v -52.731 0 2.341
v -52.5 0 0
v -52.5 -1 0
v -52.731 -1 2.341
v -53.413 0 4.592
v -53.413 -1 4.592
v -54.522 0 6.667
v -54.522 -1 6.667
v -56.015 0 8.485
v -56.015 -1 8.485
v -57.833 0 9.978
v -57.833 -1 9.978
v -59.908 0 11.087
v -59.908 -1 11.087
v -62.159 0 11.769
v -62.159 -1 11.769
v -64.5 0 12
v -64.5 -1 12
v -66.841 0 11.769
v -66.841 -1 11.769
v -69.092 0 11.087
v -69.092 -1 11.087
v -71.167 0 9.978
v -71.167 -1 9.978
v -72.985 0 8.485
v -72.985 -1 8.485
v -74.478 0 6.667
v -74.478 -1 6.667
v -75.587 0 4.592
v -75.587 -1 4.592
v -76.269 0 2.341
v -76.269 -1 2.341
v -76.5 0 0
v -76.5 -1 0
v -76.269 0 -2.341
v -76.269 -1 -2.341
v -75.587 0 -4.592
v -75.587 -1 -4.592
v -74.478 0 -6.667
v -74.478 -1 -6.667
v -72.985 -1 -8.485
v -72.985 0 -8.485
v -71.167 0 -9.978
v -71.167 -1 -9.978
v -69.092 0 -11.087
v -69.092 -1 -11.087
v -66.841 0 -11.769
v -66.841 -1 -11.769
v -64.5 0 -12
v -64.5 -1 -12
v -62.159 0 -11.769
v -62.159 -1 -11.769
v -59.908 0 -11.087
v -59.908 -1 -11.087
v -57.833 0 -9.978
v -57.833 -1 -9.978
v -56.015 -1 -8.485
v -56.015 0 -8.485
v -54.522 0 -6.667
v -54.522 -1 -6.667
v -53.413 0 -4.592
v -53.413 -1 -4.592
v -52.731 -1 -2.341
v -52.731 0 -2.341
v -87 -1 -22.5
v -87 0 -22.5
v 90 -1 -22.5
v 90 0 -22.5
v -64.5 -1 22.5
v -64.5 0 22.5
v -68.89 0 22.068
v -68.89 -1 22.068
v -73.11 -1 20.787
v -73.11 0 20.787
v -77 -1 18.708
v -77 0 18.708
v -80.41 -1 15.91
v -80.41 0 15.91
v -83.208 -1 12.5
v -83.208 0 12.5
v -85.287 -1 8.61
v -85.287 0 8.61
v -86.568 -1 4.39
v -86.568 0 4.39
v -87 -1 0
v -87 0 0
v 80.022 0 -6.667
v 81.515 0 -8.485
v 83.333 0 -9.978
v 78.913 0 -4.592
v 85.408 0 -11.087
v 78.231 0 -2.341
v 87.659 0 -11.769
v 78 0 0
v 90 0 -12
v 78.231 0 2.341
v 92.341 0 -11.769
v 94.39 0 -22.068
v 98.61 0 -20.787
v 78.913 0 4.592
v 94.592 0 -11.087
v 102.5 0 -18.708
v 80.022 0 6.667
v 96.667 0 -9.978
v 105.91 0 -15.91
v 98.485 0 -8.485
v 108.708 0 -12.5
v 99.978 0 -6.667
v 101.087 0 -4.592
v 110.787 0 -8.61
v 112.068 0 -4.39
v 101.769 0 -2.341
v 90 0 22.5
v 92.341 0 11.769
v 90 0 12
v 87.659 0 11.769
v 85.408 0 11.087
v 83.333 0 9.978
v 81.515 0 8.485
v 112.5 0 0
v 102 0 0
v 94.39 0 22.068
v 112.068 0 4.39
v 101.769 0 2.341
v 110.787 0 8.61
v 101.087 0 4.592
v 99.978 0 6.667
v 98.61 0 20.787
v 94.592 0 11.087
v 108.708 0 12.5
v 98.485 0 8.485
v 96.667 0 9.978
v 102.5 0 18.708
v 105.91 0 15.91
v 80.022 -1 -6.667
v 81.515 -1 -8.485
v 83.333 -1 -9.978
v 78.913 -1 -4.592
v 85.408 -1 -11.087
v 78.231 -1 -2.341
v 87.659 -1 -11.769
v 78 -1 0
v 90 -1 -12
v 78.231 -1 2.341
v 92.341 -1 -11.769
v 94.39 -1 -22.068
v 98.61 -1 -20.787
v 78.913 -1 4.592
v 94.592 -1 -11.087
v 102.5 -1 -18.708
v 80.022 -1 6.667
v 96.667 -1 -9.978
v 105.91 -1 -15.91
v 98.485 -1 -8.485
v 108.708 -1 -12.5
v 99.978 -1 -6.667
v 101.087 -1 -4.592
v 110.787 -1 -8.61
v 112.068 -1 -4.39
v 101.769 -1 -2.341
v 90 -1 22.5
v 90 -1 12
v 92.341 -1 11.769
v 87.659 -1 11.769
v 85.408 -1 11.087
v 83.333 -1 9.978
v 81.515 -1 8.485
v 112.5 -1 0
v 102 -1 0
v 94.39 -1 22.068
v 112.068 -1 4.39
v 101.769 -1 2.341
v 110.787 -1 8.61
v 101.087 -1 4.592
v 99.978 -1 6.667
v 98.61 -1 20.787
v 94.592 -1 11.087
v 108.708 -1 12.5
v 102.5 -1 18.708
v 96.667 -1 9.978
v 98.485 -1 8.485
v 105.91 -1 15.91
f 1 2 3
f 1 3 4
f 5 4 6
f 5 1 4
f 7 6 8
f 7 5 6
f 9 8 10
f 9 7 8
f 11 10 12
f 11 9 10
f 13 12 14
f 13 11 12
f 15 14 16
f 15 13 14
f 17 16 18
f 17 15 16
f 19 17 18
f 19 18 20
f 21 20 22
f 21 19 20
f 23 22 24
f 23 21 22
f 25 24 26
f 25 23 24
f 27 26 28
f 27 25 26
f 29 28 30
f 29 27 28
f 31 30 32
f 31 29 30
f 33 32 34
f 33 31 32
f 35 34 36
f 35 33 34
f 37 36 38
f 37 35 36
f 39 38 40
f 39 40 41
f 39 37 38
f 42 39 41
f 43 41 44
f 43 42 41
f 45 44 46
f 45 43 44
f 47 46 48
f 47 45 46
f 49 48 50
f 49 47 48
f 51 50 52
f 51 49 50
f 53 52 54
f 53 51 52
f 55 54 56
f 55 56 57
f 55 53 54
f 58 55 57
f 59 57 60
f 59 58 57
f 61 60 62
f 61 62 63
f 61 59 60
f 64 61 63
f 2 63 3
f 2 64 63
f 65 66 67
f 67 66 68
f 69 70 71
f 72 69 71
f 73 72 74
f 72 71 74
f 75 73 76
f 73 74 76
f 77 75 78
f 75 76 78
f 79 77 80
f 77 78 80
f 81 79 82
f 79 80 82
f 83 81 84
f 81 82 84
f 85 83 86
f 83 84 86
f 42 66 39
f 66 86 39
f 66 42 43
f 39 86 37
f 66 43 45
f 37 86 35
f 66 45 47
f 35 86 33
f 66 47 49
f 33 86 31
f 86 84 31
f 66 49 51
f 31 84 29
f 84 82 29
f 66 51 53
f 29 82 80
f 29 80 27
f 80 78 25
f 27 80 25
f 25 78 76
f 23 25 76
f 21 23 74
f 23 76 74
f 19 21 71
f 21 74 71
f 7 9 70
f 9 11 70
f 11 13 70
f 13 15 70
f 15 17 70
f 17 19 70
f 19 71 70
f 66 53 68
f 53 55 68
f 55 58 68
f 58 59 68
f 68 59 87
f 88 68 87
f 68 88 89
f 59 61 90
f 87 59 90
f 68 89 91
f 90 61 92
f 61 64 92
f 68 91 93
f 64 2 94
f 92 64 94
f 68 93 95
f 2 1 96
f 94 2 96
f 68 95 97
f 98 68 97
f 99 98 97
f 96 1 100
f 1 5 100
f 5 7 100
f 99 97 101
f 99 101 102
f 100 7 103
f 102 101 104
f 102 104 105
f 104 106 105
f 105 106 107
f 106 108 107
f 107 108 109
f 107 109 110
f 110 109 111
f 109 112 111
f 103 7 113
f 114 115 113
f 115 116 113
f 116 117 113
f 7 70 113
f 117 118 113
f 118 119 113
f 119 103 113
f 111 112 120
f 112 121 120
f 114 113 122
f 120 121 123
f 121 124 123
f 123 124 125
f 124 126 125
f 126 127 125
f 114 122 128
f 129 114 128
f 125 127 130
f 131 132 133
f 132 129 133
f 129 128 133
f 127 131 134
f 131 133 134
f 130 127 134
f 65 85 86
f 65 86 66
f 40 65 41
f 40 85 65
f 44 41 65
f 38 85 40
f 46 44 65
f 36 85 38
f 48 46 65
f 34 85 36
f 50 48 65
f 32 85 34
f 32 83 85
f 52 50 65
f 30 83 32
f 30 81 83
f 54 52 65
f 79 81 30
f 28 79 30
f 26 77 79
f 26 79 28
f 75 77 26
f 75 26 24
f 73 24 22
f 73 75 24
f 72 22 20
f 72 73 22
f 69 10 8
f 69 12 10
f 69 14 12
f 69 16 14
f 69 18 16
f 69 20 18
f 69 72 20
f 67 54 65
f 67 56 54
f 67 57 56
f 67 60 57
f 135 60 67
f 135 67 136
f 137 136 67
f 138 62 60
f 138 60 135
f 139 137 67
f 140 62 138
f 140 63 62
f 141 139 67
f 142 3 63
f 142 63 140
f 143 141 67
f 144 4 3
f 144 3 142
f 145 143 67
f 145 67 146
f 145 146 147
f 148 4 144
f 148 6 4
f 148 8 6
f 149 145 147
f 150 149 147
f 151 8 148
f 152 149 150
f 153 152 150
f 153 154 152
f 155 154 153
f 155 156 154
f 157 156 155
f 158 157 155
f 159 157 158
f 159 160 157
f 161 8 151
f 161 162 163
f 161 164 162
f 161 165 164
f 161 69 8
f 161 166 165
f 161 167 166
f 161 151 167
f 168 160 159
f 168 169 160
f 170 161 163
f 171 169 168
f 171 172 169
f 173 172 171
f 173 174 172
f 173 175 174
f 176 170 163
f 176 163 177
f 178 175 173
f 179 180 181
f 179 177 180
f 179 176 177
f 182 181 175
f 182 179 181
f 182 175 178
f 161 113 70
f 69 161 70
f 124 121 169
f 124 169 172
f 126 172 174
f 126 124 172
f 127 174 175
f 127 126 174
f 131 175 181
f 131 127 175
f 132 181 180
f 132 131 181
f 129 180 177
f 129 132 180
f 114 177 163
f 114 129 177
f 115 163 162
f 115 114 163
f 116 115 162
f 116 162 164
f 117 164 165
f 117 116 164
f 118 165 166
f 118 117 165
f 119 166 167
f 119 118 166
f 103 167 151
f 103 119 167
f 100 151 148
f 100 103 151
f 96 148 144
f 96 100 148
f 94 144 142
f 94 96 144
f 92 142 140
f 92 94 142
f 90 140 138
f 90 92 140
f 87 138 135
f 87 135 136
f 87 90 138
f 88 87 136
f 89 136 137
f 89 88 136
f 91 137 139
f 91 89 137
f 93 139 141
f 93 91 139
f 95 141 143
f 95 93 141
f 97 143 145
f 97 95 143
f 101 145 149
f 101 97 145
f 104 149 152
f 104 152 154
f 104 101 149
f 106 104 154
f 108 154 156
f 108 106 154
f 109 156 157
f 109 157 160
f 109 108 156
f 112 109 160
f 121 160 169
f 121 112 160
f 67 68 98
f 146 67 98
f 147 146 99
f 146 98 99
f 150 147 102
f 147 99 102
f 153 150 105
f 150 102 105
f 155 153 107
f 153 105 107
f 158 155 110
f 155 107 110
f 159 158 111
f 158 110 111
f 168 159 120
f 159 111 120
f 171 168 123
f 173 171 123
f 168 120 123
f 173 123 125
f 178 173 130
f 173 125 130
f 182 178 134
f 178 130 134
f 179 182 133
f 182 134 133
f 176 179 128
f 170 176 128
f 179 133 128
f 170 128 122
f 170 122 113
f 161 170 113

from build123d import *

# Parameters (mm, degrees)
F0_R     = 12
F1_DEPTH = 1
F3_DEPTH = 1


with BuildPart() as f1:
    # F0 (on Front) → F1 (new body)
    with BuildSketch(Plane.XZ):
        with BuildLine():
            Line((90, 22.5), (0, 22.5))
            Line((0, 22.5), (-64.5, 22.5))
            ThreePointArc((-64.5, 22.5), (-87, 0), (-64.5, -22.5))
            Line((-64.5, -22.5), (0, -22.5))
            Line((0, -22.5), (90, -22.5))
            ThreePointArc((90, -22.5), (112.5, 0), (90, 22.5))
        make_face()
        with Locations((-64.5, 0)):
            Circle(F0_R, mode=Mode.SUBTRACT)
        with Locations((90, 0)):
            Circle(F0_R, mode=Mode.SUBTRACT)
    extrude(amount=F1_DEPTH)

    # F2 (on face) → F3 (join)
    with BuildSketch(Plane.XZ.offset(1)):
        Polygon((-84.272794, -1.934636), (-87, 0), (-87, -22.5), (-64.5, -22.5), (-70.418127, -18.801184), (-80.156557, -10.970287), align=None)
    extrude(amount=-F3_DEPTH)


solid = f1.part
